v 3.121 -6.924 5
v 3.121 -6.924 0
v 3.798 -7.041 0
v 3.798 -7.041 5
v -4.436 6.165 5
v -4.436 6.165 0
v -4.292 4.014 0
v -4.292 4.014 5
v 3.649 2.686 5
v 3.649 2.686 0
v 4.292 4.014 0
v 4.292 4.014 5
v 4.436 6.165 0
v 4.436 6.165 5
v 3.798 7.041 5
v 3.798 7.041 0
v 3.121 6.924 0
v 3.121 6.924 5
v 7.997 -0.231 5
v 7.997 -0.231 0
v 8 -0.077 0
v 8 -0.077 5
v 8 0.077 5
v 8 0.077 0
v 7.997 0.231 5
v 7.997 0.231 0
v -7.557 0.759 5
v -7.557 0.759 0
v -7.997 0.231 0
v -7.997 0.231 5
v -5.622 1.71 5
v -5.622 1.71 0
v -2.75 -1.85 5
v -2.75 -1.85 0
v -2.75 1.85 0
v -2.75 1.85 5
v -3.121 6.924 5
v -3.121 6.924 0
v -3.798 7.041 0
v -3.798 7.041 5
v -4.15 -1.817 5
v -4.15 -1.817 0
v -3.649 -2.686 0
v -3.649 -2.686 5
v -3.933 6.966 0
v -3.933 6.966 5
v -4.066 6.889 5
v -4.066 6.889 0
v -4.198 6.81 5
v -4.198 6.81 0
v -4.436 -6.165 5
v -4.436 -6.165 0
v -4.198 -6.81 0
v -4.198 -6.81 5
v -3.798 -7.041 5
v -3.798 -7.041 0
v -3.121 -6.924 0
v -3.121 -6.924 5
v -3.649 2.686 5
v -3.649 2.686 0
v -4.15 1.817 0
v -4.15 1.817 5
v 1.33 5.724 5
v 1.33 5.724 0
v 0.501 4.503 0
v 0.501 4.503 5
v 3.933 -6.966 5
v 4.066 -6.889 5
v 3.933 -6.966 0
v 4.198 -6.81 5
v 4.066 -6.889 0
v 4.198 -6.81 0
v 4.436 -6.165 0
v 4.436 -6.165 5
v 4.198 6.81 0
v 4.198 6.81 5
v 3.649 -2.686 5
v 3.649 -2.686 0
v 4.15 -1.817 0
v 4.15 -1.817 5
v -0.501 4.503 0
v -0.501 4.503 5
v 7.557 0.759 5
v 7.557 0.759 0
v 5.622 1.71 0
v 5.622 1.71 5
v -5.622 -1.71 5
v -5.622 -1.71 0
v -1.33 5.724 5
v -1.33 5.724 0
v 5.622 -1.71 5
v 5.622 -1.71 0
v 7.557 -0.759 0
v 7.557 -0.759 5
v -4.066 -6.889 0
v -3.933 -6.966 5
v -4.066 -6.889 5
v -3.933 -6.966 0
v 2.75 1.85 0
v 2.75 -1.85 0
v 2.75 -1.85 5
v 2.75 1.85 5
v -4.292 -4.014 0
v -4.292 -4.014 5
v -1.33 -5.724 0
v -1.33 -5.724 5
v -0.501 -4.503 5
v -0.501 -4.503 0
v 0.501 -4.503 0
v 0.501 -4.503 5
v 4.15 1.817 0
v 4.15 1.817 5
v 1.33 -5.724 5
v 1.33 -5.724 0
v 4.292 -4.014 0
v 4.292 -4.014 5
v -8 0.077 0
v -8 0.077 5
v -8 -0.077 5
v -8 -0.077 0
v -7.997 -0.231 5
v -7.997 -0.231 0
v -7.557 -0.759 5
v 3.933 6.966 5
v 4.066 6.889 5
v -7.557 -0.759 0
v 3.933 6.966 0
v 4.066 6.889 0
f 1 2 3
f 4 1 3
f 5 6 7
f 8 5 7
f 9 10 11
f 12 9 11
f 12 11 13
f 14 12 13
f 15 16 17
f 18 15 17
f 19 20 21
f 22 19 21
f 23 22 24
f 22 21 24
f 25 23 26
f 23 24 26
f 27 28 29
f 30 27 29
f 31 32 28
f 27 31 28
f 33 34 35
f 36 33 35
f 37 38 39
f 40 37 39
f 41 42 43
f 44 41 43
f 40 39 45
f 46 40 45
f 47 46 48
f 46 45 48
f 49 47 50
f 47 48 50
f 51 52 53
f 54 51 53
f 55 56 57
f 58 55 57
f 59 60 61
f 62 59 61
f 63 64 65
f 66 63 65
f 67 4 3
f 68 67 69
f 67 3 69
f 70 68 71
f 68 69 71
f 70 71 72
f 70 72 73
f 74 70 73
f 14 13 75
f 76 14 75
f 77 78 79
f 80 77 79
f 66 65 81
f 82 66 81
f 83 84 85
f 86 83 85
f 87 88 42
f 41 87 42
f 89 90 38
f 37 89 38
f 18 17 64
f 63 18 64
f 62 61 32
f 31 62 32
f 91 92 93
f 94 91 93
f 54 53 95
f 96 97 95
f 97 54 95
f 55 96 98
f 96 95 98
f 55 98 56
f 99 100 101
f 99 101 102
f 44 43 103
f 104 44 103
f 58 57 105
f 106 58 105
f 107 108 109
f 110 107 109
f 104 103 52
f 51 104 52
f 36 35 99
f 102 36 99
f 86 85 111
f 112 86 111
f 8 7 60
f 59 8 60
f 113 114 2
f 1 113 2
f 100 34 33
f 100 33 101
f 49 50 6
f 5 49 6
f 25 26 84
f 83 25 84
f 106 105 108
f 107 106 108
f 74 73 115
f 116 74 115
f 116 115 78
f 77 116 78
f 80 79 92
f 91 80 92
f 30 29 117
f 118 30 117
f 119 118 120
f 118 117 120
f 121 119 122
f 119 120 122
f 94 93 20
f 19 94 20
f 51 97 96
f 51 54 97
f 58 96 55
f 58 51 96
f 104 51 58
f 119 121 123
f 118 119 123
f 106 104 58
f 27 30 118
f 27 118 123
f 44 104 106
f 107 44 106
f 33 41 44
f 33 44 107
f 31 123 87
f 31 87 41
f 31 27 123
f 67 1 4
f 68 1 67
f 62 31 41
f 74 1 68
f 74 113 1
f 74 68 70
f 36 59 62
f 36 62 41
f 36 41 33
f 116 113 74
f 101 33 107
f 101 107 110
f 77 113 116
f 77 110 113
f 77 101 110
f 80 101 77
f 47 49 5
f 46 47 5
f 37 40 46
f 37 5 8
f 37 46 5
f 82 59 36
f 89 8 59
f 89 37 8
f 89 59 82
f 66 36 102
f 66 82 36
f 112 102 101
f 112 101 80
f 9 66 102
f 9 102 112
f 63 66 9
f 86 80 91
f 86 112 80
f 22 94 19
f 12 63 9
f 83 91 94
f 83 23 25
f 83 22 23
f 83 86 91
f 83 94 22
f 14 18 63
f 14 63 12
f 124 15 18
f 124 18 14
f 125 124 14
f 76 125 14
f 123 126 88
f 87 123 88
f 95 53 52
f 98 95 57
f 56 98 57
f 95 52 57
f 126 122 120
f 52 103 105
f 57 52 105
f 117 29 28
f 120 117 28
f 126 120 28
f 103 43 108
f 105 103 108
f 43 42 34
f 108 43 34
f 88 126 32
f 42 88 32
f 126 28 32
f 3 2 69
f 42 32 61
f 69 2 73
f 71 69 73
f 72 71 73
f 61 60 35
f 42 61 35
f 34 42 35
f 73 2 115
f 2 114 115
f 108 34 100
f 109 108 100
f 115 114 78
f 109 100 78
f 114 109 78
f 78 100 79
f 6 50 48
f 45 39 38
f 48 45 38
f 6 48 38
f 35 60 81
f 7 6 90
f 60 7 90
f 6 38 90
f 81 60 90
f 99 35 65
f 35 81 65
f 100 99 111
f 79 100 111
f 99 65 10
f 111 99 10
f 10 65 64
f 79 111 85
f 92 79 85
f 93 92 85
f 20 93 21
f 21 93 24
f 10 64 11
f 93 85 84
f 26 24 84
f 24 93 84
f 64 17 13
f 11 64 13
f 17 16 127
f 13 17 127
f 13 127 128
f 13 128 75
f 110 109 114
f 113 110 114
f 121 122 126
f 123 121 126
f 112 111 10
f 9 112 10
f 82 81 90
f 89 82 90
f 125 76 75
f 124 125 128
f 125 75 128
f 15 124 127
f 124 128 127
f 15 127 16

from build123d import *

# Parameters (mm, degrees)
SKETCH1_R           = 8
SKETCH1_W           = 5.5
SKETCH1_H           = 3.7
BOSS_EXTRUDE1_DEPTH = 5
CUT_EXTRUDE1_DEPTH  = 13.369316877
CIRPATTERN1_COUNT   = 6


with BuildPart() as part:
    # Sketch1 → Boss-Extrude1 (new body)
    with BuildSketch(Plane.XY):
        Circle(SKETCH1_R)
        Rectangle(SKETCH1_W, SKETCH1_H, mode=Mode.SUBTRACT)
    extrude(amount=BOSS_EXTRUDE1_DEPTH)

    # Sketch2 → Cut-Extrude1 (cut, through all)
    with BuildSketch(Plane.XY):
        Polygon((-7.331932906, 22.221764399), (0, 24.952212466), (7.331932906, 22.221764399), (3.798424573, 7.040736522), (3.120998591, 6.924019842), (1.330058439, 5.723612136), (0.501497444, 4.50257488), (-0.501497444, 4.50257488), (-1.330058439, 5.723612136), (-3.120998591, 6.924019842), (-3.798424573, 7.040736522), align=None)
    cut_extrude1 = extrude(amount=CUT_EXTRUDE1_DEPTH, mode=Mode.SUBTRACT)

    # CirPattern1: Cut-Extrude1 ×6 about axis
    cirpattern1_axis = Axis((0, 0, 0), (0, 0, 1))
    for i in range(1, CIRPATTERN1_COUNT):
        add(cut_extrude1.rotate(cirpattern1_axis, i * 360 / CIRPATTERN1_COUNT), mode=Mode.SUBTRACT)


solid = part.part
